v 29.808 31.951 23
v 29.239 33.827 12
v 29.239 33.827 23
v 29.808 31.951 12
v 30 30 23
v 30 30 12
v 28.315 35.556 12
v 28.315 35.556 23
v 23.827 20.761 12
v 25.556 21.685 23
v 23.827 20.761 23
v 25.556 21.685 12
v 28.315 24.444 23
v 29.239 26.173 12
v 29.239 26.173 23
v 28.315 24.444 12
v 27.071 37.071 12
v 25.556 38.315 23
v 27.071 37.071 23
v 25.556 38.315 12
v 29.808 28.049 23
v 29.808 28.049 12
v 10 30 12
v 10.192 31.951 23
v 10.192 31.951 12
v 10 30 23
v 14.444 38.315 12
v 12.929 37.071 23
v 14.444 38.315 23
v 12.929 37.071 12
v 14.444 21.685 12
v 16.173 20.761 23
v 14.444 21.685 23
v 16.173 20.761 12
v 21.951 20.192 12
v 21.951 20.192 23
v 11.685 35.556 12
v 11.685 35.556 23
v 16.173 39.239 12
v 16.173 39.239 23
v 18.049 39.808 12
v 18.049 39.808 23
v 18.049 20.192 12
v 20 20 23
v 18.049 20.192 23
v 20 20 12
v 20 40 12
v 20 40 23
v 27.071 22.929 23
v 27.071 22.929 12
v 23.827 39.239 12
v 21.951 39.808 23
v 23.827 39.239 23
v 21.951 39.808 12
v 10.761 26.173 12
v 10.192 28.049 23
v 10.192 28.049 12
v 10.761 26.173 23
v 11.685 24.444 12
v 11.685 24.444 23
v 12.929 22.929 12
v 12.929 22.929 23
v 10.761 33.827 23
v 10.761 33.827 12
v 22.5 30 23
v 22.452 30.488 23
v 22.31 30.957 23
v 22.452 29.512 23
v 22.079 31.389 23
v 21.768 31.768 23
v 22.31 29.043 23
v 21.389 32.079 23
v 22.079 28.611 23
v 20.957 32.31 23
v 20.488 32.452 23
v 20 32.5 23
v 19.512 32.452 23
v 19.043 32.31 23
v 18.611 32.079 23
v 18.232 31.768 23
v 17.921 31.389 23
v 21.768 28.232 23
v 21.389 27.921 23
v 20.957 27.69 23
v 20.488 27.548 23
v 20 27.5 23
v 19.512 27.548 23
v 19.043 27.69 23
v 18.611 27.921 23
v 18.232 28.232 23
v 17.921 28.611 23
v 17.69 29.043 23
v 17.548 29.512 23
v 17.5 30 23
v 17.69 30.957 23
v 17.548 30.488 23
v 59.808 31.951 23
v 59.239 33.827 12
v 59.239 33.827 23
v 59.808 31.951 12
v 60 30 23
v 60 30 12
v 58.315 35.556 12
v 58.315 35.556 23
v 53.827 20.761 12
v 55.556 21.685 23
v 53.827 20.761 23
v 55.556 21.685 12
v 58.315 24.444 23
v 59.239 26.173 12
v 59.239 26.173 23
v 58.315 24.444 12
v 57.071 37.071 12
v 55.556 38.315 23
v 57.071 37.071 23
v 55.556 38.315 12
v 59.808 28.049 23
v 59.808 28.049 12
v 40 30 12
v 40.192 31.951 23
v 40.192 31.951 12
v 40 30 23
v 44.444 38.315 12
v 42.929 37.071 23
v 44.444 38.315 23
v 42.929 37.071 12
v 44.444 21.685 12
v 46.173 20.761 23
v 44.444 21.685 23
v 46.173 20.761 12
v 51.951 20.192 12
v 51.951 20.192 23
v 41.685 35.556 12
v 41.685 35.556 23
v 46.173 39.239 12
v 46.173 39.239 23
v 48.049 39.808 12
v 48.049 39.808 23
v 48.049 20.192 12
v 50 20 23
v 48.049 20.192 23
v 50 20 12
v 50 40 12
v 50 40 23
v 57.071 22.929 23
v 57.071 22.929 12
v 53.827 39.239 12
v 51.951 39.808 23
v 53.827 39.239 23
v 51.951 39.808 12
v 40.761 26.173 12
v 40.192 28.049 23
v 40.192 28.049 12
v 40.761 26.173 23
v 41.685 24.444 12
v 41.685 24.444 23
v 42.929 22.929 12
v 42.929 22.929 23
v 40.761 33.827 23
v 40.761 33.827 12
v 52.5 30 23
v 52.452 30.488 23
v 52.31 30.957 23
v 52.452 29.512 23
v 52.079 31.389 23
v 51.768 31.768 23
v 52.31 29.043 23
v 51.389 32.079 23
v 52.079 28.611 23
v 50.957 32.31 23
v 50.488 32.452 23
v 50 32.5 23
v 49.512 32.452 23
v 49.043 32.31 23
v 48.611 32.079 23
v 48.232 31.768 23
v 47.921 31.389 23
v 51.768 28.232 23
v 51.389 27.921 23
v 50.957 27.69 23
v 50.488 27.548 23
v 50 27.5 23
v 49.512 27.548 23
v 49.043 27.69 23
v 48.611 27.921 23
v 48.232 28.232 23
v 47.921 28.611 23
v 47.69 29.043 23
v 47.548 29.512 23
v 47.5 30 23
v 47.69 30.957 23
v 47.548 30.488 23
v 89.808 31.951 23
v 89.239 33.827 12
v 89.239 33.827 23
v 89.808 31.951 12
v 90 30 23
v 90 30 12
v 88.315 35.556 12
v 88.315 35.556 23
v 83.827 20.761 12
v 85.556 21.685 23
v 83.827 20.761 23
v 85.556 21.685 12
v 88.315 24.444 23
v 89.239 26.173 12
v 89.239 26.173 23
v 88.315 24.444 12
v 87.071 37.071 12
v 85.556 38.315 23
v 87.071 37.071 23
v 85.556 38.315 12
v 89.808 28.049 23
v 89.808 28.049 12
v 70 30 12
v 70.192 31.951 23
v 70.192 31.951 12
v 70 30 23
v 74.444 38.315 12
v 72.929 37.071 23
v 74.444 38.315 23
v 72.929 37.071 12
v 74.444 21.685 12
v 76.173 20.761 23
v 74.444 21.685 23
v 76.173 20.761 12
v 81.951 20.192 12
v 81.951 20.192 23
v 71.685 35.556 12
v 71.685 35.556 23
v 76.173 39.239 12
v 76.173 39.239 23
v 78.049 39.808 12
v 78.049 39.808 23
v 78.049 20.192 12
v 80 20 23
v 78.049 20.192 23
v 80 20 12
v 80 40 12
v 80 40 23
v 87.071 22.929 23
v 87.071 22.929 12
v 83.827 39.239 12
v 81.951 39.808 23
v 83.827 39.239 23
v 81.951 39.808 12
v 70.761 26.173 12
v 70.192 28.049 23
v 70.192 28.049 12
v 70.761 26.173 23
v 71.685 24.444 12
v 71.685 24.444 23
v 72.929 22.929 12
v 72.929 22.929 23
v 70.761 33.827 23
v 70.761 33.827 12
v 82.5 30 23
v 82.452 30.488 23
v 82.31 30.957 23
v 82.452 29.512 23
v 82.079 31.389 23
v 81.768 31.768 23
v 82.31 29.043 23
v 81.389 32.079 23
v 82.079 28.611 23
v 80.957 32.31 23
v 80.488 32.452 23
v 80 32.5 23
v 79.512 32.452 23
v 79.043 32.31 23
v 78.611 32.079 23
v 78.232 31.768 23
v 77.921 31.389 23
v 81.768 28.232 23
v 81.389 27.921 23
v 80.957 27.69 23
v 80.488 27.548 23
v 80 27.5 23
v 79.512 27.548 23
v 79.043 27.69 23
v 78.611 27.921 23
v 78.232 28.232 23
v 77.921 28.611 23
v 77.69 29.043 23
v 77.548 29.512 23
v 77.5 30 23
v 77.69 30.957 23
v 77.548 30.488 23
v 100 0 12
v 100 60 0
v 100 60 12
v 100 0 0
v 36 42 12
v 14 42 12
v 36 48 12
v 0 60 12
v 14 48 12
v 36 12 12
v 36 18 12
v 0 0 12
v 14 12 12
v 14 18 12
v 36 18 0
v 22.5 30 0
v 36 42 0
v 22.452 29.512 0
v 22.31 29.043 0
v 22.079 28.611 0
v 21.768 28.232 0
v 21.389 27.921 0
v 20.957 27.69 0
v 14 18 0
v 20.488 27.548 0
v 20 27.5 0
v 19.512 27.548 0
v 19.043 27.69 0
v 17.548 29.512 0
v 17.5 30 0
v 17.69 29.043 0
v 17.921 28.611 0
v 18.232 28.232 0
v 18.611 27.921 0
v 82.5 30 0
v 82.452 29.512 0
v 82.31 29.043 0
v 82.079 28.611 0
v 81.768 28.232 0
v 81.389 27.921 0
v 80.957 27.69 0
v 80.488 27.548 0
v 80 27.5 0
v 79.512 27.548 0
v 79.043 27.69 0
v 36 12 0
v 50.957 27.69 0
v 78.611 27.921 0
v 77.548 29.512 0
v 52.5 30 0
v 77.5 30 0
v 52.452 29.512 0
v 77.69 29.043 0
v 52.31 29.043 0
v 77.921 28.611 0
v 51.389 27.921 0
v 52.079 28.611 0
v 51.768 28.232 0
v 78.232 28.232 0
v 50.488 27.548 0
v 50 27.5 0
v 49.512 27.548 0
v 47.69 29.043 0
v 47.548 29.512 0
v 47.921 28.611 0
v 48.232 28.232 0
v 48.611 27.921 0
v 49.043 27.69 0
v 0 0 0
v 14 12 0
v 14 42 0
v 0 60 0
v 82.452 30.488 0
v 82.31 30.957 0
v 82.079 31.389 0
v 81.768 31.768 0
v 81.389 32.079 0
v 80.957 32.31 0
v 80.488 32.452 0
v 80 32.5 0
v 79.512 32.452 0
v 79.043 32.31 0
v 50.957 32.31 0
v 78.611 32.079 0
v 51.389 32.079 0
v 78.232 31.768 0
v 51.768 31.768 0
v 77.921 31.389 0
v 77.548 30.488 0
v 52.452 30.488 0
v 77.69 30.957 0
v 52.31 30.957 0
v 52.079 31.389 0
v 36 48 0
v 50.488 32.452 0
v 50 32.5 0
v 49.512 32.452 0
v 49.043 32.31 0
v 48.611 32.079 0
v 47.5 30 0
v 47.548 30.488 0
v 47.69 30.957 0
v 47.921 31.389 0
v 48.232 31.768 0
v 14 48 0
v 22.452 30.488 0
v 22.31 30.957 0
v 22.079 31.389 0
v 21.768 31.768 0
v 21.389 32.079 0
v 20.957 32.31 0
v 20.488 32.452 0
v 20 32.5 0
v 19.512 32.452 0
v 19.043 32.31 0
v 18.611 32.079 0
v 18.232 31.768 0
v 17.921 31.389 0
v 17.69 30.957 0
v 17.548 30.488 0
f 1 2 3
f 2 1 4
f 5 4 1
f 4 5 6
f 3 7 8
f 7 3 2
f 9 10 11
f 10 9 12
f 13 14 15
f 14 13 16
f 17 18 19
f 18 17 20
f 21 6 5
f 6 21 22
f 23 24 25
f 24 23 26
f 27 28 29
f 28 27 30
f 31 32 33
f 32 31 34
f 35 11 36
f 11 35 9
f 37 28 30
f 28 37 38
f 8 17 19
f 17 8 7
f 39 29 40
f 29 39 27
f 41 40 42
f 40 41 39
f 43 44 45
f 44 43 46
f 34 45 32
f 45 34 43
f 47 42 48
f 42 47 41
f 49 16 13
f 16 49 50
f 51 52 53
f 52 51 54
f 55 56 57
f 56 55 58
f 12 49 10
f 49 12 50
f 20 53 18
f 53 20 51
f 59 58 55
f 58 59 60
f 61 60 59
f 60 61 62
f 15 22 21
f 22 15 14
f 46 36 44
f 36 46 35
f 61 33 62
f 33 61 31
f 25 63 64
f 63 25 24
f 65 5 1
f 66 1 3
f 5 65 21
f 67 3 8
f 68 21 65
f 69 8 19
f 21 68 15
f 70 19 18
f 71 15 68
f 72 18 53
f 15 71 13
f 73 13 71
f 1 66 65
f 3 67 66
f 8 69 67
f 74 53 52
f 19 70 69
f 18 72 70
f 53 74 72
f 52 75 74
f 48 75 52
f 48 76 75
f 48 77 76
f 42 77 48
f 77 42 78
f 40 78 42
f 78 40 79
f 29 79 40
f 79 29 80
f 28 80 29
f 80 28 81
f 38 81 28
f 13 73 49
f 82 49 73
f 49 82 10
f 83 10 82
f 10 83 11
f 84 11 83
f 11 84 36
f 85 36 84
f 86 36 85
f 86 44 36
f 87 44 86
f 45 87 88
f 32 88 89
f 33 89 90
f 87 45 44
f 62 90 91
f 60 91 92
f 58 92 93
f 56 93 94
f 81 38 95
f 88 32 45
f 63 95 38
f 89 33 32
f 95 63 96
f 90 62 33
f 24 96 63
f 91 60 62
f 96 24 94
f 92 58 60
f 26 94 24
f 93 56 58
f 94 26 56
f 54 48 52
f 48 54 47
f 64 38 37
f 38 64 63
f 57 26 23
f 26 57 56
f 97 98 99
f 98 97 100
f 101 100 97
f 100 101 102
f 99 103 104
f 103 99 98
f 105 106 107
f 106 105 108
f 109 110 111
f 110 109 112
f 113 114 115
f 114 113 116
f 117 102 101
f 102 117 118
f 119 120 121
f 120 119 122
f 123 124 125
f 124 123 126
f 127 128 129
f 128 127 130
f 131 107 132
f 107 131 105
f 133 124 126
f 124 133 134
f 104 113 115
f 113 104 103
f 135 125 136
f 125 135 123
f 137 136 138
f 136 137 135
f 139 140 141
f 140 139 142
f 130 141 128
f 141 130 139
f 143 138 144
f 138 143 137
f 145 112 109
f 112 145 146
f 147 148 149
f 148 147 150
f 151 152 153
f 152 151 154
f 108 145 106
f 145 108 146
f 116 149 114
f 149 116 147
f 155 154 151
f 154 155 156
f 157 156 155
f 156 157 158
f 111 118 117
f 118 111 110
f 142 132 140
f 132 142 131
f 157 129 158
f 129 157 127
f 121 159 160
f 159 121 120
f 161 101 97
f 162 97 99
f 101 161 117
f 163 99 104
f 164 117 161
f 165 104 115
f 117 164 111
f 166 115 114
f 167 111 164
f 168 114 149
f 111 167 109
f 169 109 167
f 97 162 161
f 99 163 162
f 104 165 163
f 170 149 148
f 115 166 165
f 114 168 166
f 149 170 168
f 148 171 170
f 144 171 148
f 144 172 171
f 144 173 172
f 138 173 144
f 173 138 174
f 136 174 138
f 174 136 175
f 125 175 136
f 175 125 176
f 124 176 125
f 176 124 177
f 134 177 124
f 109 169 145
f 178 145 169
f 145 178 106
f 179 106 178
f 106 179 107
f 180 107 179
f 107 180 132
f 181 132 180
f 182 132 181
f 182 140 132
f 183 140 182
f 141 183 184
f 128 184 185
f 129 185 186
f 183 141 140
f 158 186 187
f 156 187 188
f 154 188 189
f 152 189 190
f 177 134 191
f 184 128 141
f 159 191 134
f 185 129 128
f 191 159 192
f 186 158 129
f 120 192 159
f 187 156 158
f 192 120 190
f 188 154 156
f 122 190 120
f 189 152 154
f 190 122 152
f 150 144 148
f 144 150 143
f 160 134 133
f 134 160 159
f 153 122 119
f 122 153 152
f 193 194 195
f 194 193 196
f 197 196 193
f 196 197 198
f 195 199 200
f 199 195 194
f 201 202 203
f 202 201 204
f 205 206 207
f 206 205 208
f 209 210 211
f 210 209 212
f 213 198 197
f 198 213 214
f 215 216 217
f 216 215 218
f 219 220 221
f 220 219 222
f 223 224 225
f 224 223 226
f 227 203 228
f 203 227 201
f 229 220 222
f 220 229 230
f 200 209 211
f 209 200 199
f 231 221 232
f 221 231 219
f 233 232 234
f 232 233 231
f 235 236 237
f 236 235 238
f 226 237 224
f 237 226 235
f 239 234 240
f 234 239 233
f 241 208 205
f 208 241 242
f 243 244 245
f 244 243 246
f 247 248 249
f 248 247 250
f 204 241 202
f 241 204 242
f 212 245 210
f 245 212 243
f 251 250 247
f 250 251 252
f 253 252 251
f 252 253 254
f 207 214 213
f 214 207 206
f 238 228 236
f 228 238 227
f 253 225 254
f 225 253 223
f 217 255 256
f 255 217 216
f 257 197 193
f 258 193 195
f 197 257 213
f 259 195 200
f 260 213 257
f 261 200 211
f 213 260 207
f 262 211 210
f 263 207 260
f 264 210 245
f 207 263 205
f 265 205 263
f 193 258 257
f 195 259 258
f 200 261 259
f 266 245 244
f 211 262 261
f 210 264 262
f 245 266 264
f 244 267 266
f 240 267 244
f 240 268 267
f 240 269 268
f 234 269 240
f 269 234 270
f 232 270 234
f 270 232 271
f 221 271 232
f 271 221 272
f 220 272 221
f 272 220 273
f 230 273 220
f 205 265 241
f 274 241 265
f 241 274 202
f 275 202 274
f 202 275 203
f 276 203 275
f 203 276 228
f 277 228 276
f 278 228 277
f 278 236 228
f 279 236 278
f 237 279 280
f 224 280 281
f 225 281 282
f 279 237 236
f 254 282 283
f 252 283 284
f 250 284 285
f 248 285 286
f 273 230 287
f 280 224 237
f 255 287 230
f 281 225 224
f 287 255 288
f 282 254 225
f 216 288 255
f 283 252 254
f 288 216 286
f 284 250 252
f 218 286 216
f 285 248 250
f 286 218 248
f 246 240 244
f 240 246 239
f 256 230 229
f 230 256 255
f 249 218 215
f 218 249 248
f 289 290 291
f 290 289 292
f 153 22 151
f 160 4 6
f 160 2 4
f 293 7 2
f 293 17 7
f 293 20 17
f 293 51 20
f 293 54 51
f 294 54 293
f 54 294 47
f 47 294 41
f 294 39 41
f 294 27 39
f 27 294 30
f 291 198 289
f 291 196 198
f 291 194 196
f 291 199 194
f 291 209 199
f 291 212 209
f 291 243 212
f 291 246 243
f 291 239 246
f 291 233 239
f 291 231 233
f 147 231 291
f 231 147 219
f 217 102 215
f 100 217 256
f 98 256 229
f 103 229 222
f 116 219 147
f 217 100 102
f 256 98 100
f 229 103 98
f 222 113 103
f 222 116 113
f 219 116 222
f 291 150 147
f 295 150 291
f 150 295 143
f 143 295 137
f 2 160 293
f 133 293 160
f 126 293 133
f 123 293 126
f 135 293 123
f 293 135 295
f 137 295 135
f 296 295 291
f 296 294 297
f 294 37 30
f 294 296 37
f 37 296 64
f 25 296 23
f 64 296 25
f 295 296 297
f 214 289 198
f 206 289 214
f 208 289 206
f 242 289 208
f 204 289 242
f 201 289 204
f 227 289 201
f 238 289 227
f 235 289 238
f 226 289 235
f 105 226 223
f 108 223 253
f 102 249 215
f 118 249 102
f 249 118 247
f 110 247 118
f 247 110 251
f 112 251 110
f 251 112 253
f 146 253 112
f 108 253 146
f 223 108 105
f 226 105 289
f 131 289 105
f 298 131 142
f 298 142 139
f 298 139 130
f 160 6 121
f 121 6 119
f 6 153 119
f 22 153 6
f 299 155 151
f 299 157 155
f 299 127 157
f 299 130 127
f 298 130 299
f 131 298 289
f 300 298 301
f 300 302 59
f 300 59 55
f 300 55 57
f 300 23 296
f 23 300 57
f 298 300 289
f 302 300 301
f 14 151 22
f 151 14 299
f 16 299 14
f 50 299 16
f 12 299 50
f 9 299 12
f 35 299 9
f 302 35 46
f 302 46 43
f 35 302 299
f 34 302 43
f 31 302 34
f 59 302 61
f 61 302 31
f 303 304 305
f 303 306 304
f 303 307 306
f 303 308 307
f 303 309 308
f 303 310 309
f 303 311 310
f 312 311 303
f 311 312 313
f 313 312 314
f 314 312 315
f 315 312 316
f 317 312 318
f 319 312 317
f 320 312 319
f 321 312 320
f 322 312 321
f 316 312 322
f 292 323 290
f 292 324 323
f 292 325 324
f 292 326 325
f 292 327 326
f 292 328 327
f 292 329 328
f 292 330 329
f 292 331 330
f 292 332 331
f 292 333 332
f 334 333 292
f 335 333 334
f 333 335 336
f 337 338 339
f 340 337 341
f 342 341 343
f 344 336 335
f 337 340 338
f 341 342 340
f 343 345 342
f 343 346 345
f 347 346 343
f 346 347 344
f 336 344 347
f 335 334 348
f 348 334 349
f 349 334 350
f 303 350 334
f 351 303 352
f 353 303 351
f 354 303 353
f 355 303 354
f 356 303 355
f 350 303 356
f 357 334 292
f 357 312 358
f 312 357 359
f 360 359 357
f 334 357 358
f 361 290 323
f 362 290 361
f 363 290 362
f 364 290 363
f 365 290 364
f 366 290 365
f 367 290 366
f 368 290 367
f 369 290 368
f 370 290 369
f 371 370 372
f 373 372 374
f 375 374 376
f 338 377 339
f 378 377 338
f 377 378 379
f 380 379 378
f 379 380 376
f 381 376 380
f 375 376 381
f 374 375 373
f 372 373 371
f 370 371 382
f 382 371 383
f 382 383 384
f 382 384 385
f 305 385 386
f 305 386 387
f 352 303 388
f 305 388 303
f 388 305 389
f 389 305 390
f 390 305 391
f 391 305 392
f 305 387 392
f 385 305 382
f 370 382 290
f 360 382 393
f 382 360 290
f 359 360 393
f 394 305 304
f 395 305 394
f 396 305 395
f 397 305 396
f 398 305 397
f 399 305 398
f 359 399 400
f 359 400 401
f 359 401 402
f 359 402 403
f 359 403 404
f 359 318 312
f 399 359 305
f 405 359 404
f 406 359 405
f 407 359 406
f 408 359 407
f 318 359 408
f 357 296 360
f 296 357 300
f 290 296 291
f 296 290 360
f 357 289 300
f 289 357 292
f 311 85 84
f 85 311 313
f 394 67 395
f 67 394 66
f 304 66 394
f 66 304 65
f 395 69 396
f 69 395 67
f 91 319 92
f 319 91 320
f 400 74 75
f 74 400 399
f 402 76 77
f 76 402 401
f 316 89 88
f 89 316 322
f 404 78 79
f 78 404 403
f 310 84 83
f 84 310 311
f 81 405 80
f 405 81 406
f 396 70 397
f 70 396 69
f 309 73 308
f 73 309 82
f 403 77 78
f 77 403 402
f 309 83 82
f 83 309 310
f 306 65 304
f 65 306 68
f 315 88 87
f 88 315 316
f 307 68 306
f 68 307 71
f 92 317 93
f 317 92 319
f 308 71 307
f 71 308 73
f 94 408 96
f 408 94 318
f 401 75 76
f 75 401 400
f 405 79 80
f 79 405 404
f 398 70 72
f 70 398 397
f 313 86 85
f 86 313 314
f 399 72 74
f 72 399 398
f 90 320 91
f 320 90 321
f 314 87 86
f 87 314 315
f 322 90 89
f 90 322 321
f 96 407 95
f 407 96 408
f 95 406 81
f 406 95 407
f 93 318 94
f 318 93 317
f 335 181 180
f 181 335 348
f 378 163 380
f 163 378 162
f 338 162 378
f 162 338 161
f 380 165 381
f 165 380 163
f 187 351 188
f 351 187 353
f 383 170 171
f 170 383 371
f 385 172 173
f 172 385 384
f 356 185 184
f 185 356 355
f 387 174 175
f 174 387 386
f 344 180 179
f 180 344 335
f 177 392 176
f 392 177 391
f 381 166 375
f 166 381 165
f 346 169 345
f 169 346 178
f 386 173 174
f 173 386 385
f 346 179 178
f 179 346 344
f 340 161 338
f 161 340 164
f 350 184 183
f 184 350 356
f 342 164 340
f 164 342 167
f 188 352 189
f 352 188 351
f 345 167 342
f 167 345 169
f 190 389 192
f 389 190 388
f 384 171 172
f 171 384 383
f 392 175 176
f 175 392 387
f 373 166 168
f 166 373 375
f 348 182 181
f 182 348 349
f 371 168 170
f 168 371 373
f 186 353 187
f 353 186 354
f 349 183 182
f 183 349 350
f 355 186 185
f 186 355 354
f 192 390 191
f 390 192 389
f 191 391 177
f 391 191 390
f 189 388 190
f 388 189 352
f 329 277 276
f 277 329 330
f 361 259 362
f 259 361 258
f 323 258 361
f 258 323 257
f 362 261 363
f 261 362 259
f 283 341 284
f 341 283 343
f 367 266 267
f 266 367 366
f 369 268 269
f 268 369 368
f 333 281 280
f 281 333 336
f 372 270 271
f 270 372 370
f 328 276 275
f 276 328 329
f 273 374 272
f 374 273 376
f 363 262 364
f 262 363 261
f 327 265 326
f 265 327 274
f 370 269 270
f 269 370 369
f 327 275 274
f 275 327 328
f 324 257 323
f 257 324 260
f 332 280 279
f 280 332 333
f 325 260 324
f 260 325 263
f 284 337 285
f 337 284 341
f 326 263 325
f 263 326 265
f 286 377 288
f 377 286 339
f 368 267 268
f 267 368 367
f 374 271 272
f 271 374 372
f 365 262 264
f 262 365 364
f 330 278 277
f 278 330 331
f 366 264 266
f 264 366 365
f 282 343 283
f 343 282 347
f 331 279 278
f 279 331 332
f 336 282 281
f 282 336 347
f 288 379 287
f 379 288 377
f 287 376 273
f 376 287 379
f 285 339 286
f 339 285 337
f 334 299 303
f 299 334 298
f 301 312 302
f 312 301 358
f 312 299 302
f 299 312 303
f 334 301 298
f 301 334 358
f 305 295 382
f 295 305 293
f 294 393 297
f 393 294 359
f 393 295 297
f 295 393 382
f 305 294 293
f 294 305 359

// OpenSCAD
$fn = 32;

// ----------------------------------------------------------------------
// Drill jig: three_boss_slot jig
// ----------------------------------------------------------------------

// --- parameters (mm) ---
plate_l = 100;            // plate length, X
plate_w = 60;             // plate width, Y
plate_t = 12;             // plate thickness
boss_d = 20;              // guide boss diameter
boss_h = 12;              // boss height above the plate
guide_d = 5;              // guide hole diameter
boss_pitch = 30;          // boss pitch
slot_w = 6;               // clamp slot width
slot_l = 22;              // clamp slot length
slot_x = 14;              // slot start X

n_boss = 3;  // guide bosses
boss_x0 = (plate_l - (n_boss - 1) * boss_pitch) / 2;  // first boss X
boss_top = plate_t - 1 + boss_h;  // boss crown height
total_h = boss_top;  // overall height

difference() {
  union() {
  cube([plate_l, plate_w, plate_t]);
  for (i = [0 : n_boss - 1])
    translate([boss_x0 + i * boss_pitch, plate_w / 2, plate_t - 1])
      cylinder(h = boss_h, d = boss_d);
  }
  for (i = [0 : n_boss - 1])
    translate([boss_x0 + i * boss_pitch, plate_w / 2, -1])
      cylinder(h = plate_t + boss_h, d = guide_d);
  for (cy = [plate_w * 0.25, plate_w * 0.75])
    translate([slot_x, cy - slot_w / 2, -1])
      cube([slot_l, slot_w, plate_t + 2]);
}
